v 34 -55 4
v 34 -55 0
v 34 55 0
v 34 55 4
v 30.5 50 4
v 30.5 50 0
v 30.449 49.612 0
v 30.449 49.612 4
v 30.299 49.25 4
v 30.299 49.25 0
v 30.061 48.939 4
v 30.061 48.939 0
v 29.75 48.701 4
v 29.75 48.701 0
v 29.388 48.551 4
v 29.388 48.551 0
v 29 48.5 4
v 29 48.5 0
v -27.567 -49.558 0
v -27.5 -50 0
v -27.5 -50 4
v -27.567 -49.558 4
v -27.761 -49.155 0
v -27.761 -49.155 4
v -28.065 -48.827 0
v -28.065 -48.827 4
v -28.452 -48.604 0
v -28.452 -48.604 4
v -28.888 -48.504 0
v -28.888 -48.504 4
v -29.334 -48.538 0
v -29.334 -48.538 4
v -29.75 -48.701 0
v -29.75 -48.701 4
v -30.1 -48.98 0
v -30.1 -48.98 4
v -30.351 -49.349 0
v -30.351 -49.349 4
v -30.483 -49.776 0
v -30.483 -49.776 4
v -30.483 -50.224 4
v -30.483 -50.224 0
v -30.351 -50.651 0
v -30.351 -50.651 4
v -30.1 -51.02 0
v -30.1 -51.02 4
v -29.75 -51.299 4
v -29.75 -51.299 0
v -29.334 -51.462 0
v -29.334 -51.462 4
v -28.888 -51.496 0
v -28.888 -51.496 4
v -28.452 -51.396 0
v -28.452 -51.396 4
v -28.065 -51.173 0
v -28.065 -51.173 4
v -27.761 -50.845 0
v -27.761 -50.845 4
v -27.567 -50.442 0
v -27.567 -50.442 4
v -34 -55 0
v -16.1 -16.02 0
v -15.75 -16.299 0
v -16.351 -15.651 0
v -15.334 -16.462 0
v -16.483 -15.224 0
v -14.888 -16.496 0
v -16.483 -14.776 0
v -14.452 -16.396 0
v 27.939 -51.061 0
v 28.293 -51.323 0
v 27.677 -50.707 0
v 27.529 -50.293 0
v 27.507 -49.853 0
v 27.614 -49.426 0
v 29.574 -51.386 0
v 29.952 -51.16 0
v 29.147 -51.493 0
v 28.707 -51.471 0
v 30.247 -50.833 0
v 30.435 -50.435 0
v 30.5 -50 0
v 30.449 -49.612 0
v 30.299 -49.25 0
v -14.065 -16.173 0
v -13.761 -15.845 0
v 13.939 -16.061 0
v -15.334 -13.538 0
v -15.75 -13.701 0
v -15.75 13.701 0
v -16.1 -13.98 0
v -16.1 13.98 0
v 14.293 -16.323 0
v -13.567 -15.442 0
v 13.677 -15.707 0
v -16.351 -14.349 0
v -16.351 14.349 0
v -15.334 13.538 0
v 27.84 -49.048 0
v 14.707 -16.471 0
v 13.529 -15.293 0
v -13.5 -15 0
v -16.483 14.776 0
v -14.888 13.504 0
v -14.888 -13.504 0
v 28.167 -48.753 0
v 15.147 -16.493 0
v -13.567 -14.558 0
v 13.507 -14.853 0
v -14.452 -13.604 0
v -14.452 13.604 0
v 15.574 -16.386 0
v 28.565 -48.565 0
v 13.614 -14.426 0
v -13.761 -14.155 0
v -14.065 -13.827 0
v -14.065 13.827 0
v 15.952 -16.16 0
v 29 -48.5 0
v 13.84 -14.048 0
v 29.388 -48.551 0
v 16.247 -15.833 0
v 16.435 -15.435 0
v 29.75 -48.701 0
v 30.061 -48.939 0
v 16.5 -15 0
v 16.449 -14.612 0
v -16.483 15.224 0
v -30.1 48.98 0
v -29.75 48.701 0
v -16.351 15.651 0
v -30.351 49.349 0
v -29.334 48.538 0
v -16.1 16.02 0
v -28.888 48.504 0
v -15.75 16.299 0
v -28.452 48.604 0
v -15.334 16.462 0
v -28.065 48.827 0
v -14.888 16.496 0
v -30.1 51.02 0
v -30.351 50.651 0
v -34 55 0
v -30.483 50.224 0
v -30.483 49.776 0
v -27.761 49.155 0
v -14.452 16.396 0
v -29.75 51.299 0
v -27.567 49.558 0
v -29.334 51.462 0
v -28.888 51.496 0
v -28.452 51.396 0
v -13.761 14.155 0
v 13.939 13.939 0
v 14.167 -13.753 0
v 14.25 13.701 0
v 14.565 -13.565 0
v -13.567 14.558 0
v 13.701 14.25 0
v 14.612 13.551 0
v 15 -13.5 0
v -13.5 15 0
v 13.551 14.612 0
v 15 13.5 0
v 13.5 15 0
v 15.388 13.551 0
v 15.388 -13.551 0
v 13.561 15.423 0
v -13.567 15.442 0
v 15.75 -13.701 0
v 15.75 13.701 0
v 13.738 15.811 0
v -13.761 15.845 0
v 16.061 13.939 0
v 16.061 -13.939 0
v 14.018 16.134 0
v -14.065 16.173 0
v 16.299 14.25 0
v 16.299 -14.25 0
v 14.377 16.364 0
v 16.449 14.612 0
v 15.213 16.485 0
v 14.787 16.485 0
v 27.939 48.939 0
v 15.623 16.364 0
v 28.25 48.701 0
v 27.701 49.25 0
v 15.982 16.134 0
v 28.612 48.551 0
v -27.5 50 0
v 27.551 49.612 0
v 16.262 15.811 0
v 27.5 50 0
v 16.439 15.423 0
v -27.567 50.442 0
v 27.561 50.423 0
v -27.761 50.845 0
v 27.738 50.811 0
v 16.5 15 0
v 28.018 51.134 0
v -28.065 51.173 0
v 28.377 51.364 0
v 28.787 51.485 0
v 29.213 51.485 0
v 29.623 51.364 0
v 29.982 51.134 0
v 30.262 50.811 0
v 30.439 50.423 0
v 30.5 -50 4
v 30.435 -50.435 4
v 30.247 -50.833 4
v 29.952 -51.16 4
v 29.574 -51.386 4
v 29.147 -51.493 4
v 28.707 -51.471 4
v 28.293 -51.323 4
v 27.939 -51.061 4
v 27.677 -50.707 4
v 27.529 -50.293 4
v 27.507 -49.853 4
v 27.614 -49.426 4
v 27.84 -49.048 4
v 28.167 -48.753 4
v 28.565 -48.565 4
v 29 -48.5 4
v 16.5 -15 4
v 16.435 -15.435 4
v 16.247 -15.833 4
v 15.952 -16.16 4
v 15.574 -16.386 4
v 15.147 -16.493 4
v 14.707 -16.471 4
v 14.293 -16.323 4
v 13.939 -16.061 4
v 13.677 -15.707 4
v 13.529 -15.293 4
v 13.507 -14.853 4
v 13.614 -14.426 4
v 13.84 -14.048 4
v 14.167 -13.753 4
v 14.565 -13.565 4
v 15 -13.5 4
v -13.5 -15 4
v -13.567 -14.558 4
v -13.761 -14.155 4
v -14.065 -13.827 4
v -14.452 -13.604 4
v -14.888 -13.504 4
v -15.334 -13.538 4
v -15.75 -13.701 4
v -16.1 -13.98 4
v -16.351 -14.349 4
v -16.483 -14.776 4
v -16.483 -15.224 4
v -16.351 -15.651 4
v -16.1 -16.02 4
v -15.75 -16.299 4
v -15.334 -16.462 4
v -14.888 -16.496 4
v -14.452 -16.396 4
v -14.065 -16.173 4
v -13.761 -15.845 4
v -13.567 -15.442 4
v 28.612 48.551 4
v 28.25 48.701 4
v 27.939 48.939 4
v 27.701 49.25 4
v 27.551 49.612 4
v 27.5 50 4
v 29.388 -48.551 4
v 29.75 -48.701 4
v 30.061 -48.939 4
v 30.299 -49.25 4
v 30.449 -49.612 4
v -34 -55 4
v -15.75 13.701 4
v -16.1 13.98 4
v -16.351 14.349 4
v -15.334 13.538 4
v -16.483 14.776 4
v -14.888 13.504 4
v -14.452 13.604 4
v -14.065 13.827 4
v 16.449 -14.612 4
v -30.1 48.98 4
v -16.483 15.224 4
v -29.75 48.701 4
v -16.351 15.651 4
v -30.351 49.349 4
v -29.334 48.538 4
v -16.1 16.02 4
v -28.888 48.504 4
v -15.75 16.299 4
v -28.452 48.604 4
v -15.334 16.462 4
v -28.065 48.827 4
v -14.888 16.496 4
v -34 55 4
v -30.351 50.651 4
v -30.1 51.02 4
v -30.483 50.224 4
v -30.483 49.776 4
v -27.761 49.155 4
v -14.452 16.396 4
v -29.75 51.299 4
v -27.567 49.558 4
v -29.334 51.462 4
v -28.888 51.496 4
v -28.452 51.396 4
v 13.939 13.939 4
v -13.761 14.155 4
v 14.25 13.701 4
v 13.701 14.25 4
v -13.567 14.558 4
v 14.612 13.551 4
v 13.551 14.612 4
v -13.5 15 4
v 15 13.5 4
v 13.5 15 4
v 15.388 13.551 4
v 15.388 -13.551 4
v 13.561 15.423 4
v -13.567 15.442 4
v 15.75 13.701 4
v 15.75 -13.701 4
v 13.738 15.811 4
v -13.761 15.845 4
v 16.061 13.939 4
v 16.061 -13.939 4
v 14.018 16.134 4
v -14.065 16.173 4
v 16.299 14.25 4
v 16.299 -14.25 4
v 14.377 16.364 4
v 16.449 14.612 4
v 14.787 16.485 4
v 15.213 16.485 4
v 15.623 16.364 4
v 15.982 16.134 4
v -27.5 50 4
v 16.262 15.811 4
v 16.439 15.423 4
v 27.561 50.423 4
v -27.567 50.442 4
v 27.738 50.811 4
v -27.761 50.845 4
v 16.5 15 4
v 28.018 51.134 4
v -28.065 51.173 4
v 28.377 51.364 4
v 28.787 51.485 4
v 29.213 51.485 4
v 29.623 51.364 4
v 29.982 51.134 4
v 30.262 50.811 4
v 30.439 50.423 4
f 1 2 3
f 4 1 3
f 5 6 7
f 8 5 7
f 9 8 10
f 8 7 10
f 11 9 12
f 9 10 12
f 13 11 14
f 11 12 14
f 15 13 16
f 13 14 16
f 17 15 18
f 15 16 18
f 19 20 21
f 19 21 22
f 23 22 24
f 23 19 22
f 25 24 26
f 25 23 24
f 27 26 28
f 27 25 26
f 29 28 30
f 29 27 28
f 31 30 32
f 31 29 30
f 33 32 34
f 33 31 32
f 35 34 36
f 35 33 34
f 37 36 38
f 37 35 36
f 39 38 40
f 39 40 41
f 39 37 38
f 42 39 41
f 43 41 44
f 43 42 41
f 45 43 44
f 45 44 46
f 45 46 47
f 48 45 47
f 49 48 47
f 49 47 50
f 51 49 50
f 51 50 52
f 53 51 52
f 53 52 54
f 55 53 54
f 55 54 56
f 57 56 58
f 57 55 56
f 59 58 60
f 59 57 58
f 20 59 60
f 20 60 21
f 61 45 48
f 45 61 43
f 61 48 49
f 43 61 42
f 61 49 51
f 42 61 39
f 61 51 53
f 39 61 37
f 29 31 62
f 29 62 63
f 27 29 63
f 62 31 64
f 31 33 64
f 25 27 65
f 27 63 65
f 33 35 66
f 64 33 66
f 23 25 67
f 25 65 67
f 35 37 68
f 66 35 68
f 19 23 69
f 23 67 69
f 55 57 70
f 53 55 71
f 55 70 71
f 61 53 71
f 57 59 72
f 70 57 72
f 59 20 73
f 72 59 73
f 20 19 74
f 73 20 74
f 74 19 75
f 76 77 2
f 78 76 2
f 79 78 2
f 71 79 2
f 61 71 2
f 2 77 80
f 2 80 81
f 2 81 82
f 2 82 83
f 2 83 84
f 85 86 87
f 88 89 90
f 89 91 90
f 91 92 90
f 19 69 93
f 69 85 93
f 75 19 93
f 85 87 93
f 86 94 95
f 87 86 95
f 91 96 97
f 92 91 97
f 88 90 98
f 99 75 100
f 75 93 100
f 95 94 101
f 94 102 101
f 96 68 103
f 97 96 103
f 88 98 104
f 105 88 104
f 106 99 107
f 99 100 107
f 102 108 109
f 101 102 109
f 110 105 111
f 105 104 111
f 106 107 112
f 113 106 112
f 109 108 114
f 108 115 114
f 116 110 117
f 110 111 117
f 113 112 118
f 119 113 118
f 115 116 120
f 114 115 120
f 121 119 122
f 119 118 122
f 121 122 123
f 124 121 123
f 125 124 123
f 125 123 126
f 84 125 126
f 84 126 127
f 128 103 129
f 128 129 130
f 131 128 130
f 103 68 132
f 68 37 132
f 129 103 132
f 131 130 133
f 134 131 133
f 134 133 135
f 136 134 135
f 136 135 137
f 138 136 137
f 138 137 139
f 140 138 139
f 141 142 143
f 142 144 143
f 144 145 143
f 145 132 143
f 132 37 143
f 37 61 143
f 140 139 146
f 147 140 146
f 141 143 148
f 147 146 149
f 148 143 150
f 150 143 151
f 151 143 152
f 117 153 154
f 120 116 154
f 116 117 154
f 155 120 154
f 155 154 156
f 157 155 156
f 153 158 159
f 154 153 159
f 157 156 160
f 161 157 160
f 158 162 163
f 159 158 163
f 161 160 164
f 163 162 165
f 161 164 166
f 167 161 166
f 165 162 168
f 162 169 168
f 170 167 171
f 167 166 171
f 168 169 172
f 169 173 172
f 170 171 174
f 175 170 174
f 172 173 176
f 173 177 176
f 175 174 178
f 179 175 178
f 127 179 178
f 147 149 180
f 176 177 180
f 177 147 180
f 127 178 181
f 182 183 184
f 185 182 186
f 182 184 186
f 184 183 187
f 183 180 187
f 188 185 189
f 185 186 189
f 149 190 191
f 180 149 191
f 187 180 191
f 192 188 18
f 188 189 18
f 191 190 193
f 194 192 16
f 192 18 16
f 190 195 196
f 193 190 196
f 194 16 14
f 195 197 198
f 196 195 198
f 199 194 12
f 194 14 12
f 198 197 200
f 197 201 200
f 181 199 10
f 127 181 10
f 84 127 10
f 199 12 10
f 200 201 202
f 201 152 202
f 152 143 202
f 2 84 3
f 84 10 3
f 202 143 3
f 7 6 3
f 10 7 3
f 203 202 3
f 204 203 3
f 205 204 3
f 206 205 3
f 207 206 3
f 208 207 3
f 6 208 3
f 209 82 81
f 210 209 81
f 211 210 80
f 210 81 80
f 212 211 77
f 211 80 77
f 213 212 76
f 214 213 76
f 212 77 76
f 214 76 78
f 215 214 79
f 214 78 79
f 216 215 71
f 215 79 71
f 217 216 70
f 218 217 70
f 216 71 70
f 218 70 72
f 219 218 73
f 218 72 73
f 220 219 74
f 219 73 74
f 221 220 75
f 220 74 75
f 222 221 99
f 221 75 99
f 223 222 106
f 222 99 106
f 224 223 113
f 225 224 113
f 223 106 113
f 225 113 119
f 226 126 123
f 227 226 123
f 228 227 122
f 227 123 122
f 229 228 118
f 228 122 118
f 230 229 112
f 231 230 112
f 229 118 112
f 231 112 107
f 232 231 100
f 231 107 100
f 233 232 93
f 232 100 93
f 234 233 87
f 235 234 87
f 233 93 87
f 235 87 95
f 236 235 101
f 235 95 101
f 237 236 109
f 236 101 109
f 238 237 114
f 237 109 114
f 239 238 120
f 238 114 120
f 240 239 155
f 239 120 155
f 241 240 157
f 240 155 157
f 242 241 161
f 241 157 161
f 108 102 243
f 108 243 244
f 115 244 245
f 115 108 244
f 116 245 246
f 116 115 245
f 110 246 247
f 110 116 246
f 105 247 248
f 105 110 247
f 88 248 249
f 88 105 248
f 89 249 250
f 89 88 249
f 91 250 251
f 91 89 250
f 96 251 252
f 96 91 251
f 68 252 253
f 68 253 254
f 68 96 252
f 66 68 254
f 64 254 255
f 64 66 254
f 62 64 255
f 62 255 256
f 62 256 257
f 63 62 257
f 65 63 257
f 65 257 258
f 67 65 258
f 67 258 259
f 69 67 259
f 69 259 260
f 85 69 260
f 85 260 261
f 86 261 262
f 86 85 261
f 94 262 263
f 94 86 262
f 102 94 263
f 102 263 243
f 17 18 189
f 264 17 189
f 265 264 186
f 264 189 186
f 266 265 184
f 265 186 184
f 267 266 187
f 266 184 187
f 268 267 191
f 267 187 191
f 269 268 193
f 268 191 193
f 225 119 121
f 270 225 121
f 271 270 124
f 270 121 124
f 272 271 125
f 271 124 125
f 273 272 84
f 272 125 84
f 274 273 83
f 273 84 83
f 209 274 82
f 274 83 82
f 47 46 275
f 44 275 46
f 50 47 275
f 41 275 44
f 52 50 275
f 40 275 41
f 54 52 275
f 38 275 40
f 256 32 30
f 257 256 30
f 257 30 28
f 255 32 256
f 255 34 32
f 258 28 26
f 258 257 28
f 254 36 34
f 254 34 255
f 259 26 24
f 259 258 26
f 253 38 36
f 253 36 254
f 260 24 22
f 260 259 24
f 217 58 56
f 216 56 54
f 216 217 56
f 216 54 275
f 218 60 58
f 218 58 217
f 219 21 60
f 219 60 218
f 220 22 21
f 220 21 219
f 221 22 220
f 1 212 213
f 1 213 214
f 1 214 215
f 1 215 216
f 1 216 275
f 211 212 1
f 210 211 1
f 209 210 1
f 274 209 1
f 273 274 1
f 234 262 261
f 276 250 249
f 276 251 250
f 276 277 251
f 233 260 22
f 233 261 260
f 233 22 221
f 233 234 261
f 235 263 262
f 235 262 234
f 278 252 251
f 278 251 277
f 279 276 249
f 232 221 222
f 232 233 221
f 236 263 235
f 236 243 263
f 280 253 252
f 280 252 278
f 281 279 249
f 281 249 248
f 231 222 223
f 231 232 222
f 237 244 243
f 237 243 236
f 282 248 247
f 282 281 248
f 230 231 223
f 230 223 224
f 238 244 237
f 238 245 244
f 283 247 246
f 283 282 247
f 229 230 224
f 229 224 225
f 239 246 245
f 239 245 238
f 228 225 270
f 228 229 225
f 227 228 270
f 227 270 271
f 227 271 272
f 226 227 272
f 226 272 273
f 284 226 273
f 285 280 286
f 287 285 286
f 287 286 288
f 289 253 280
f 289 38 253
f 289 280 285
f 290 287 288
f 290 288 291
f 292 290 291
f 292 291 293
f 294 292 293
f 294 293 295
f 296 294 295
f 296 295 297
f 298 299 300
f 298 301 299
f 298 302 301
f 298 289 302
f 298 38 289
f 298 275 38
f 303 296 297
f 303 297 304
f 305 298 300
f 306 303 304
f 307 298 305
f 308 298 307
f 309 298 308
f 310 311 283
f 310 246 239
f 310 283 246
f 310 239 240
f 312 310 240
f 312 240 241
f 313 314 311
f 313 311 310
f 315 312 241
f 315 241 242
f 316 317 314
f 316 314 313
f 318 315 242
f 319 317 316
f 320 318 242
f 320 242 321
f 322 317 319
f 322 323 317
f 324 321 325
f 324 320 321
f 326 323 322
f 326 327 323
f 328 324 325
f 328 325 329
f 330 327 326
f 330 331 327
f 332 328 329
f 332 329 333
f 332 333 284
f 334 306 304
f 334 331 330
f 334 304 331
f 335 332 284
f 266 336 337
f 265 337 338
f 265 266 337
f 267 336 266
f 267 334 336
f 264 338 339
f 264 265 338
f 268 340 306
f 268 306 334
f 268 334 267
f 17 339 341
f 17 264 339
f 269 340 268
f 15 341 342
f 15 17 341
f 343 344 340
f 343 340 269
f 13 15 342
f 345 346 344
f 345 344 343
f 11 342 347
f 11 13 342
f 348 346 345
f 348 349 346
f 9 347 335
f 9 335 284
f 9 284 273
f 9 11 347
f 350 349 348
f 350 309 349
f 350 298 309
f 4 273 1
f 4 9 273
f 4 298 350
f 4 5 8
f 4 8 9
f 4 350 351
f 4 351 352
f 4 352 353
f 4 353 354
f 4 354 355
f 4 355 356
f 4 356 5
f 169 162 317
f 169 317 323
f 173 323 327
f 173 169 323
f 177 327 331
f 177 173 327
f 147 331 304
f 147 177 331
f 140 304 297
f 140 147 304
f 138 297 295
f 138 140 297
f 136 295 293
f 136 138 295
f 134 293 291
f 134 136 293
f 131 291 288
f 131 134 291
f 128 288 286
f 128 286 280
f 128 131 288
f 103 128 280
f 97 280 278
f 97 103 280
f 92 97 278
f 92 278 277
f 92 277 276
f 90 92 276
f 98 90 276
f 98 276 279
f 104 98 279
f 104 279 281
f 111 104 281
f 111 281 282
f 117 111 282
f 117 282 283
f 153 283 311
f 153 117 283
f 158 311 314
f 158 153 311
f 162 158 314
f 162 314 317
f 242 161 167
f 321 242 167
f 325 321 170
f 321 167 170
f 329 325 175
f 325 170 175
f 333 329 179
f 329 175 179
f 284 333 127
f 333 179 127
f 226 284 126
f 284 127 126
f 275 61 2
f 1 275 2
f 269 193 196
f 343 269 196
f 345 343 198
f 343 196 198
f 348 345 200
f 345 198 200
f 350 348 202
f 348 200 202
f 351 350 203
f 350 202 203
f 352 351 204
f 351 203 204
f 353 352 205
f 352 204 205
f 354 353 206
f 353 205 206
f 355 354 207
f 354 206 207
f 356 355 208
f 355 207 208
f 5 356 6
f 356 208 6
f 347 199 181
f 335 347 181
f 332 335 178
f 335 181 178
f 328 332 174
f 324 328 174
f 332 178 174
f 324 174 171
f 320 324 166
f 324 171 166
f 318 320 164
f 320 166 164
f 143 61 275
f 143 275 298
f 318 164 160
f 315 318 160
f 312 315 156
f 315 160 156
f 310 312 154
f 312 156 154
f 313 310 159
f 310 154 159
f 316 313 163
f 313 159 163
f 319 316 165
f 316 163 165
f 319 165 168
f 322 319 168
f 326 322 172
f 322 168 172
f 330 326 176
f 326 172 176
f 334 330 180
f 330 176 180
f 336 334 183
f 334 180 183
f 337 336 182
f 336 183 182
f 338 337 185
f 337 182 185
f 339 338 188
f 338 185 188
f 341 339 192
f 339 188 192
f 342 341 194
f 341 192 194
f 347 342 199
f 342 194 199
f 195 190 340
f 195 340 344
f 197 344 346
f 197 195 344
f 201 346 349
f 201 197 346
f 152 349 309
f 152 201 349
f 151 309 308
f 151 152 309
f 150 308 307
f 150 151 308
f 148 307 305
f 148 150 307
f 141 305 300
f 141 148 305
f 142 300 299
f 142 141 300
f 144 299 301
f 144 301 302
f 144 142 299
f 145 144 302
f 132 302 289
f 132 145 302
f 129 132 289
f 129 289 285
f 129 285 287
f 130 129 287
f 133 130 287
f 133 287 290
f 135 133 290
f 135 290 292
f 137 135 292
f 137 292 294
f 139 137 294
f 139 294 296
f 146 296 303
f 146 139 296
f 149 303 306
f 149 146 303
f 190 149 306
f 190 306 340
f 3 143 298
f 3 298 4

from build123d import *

# Parameters (mm, degrees)
F0_W     = 68
F0_H     = 110
F0_R     = 1.5
F1_DEPTH = 4


with BuildPart() as f1:
    # F0 (on Top) → F1 (new body)
    with BuildSketch(Plane.XY):
        Rectangle(F0_W, F0_H)
        with Locations((-29, -50)):
            Circle(F0_R, mode=Mode.SUBTRACT)
        with Locations((-15, -15)):
            Circle(F0_R, mode=Mode.SUBTRACT)
        with BuildLine():
            ThreePointArc((30.5, -50), (27.9393398282, -51.0606601718), (29, -48.5))
            ThreePointArc((29, -48.5), (30.0606601718, -48.9393398282), (30.5, -50))
        make_face(mode=Mode.SUBTRACT)
        with BuildLine():
            ThreePointArc((16.5, -15), (13.9393398282, -16.0606601718), (15, -13.5))
            ThreePointArc((15, -13.5), (16.0606601718, -13.9393398282), (16.5, -15))
        make_face(mode=Mode.SUBTRACT)
        with Locations((-15, 15)):
            Circle(F0_R, mode=Mode.SUBTRACT)
        with Locations((-29, 50)):
            Circle(F0_R, mode=Mode.SUBTRACT)
        with BuildLine():
            ThreePointArc((15, 13.5), (13.9393398282, 13.9393398282), (13.5, 15))
            ThreePointArc((13.5, 15), (15, 16.5), (16.5, 15))
            ThreePointArc((16.5, 15), (16.0606601718, 13.9393398282), (15, 13.5))
        make_face(mode=Mode.SUBTRACT)
        with BuildLine():
            ThreePointArc((29, 48.5), (27.9393398282, 48.9393398282), (27.5, 50))
            ThreePointArc((27.5, 50), (29, 51.5), (30.5, 50))
            ThreePointArc((30.5, 50), (30.0606601718, 48.9393398282), (29, 48.5))
        make_face(mode=Mode.SUBTRACT)
    extrude(amount=F1_DEPTH)


solid = f1.part
